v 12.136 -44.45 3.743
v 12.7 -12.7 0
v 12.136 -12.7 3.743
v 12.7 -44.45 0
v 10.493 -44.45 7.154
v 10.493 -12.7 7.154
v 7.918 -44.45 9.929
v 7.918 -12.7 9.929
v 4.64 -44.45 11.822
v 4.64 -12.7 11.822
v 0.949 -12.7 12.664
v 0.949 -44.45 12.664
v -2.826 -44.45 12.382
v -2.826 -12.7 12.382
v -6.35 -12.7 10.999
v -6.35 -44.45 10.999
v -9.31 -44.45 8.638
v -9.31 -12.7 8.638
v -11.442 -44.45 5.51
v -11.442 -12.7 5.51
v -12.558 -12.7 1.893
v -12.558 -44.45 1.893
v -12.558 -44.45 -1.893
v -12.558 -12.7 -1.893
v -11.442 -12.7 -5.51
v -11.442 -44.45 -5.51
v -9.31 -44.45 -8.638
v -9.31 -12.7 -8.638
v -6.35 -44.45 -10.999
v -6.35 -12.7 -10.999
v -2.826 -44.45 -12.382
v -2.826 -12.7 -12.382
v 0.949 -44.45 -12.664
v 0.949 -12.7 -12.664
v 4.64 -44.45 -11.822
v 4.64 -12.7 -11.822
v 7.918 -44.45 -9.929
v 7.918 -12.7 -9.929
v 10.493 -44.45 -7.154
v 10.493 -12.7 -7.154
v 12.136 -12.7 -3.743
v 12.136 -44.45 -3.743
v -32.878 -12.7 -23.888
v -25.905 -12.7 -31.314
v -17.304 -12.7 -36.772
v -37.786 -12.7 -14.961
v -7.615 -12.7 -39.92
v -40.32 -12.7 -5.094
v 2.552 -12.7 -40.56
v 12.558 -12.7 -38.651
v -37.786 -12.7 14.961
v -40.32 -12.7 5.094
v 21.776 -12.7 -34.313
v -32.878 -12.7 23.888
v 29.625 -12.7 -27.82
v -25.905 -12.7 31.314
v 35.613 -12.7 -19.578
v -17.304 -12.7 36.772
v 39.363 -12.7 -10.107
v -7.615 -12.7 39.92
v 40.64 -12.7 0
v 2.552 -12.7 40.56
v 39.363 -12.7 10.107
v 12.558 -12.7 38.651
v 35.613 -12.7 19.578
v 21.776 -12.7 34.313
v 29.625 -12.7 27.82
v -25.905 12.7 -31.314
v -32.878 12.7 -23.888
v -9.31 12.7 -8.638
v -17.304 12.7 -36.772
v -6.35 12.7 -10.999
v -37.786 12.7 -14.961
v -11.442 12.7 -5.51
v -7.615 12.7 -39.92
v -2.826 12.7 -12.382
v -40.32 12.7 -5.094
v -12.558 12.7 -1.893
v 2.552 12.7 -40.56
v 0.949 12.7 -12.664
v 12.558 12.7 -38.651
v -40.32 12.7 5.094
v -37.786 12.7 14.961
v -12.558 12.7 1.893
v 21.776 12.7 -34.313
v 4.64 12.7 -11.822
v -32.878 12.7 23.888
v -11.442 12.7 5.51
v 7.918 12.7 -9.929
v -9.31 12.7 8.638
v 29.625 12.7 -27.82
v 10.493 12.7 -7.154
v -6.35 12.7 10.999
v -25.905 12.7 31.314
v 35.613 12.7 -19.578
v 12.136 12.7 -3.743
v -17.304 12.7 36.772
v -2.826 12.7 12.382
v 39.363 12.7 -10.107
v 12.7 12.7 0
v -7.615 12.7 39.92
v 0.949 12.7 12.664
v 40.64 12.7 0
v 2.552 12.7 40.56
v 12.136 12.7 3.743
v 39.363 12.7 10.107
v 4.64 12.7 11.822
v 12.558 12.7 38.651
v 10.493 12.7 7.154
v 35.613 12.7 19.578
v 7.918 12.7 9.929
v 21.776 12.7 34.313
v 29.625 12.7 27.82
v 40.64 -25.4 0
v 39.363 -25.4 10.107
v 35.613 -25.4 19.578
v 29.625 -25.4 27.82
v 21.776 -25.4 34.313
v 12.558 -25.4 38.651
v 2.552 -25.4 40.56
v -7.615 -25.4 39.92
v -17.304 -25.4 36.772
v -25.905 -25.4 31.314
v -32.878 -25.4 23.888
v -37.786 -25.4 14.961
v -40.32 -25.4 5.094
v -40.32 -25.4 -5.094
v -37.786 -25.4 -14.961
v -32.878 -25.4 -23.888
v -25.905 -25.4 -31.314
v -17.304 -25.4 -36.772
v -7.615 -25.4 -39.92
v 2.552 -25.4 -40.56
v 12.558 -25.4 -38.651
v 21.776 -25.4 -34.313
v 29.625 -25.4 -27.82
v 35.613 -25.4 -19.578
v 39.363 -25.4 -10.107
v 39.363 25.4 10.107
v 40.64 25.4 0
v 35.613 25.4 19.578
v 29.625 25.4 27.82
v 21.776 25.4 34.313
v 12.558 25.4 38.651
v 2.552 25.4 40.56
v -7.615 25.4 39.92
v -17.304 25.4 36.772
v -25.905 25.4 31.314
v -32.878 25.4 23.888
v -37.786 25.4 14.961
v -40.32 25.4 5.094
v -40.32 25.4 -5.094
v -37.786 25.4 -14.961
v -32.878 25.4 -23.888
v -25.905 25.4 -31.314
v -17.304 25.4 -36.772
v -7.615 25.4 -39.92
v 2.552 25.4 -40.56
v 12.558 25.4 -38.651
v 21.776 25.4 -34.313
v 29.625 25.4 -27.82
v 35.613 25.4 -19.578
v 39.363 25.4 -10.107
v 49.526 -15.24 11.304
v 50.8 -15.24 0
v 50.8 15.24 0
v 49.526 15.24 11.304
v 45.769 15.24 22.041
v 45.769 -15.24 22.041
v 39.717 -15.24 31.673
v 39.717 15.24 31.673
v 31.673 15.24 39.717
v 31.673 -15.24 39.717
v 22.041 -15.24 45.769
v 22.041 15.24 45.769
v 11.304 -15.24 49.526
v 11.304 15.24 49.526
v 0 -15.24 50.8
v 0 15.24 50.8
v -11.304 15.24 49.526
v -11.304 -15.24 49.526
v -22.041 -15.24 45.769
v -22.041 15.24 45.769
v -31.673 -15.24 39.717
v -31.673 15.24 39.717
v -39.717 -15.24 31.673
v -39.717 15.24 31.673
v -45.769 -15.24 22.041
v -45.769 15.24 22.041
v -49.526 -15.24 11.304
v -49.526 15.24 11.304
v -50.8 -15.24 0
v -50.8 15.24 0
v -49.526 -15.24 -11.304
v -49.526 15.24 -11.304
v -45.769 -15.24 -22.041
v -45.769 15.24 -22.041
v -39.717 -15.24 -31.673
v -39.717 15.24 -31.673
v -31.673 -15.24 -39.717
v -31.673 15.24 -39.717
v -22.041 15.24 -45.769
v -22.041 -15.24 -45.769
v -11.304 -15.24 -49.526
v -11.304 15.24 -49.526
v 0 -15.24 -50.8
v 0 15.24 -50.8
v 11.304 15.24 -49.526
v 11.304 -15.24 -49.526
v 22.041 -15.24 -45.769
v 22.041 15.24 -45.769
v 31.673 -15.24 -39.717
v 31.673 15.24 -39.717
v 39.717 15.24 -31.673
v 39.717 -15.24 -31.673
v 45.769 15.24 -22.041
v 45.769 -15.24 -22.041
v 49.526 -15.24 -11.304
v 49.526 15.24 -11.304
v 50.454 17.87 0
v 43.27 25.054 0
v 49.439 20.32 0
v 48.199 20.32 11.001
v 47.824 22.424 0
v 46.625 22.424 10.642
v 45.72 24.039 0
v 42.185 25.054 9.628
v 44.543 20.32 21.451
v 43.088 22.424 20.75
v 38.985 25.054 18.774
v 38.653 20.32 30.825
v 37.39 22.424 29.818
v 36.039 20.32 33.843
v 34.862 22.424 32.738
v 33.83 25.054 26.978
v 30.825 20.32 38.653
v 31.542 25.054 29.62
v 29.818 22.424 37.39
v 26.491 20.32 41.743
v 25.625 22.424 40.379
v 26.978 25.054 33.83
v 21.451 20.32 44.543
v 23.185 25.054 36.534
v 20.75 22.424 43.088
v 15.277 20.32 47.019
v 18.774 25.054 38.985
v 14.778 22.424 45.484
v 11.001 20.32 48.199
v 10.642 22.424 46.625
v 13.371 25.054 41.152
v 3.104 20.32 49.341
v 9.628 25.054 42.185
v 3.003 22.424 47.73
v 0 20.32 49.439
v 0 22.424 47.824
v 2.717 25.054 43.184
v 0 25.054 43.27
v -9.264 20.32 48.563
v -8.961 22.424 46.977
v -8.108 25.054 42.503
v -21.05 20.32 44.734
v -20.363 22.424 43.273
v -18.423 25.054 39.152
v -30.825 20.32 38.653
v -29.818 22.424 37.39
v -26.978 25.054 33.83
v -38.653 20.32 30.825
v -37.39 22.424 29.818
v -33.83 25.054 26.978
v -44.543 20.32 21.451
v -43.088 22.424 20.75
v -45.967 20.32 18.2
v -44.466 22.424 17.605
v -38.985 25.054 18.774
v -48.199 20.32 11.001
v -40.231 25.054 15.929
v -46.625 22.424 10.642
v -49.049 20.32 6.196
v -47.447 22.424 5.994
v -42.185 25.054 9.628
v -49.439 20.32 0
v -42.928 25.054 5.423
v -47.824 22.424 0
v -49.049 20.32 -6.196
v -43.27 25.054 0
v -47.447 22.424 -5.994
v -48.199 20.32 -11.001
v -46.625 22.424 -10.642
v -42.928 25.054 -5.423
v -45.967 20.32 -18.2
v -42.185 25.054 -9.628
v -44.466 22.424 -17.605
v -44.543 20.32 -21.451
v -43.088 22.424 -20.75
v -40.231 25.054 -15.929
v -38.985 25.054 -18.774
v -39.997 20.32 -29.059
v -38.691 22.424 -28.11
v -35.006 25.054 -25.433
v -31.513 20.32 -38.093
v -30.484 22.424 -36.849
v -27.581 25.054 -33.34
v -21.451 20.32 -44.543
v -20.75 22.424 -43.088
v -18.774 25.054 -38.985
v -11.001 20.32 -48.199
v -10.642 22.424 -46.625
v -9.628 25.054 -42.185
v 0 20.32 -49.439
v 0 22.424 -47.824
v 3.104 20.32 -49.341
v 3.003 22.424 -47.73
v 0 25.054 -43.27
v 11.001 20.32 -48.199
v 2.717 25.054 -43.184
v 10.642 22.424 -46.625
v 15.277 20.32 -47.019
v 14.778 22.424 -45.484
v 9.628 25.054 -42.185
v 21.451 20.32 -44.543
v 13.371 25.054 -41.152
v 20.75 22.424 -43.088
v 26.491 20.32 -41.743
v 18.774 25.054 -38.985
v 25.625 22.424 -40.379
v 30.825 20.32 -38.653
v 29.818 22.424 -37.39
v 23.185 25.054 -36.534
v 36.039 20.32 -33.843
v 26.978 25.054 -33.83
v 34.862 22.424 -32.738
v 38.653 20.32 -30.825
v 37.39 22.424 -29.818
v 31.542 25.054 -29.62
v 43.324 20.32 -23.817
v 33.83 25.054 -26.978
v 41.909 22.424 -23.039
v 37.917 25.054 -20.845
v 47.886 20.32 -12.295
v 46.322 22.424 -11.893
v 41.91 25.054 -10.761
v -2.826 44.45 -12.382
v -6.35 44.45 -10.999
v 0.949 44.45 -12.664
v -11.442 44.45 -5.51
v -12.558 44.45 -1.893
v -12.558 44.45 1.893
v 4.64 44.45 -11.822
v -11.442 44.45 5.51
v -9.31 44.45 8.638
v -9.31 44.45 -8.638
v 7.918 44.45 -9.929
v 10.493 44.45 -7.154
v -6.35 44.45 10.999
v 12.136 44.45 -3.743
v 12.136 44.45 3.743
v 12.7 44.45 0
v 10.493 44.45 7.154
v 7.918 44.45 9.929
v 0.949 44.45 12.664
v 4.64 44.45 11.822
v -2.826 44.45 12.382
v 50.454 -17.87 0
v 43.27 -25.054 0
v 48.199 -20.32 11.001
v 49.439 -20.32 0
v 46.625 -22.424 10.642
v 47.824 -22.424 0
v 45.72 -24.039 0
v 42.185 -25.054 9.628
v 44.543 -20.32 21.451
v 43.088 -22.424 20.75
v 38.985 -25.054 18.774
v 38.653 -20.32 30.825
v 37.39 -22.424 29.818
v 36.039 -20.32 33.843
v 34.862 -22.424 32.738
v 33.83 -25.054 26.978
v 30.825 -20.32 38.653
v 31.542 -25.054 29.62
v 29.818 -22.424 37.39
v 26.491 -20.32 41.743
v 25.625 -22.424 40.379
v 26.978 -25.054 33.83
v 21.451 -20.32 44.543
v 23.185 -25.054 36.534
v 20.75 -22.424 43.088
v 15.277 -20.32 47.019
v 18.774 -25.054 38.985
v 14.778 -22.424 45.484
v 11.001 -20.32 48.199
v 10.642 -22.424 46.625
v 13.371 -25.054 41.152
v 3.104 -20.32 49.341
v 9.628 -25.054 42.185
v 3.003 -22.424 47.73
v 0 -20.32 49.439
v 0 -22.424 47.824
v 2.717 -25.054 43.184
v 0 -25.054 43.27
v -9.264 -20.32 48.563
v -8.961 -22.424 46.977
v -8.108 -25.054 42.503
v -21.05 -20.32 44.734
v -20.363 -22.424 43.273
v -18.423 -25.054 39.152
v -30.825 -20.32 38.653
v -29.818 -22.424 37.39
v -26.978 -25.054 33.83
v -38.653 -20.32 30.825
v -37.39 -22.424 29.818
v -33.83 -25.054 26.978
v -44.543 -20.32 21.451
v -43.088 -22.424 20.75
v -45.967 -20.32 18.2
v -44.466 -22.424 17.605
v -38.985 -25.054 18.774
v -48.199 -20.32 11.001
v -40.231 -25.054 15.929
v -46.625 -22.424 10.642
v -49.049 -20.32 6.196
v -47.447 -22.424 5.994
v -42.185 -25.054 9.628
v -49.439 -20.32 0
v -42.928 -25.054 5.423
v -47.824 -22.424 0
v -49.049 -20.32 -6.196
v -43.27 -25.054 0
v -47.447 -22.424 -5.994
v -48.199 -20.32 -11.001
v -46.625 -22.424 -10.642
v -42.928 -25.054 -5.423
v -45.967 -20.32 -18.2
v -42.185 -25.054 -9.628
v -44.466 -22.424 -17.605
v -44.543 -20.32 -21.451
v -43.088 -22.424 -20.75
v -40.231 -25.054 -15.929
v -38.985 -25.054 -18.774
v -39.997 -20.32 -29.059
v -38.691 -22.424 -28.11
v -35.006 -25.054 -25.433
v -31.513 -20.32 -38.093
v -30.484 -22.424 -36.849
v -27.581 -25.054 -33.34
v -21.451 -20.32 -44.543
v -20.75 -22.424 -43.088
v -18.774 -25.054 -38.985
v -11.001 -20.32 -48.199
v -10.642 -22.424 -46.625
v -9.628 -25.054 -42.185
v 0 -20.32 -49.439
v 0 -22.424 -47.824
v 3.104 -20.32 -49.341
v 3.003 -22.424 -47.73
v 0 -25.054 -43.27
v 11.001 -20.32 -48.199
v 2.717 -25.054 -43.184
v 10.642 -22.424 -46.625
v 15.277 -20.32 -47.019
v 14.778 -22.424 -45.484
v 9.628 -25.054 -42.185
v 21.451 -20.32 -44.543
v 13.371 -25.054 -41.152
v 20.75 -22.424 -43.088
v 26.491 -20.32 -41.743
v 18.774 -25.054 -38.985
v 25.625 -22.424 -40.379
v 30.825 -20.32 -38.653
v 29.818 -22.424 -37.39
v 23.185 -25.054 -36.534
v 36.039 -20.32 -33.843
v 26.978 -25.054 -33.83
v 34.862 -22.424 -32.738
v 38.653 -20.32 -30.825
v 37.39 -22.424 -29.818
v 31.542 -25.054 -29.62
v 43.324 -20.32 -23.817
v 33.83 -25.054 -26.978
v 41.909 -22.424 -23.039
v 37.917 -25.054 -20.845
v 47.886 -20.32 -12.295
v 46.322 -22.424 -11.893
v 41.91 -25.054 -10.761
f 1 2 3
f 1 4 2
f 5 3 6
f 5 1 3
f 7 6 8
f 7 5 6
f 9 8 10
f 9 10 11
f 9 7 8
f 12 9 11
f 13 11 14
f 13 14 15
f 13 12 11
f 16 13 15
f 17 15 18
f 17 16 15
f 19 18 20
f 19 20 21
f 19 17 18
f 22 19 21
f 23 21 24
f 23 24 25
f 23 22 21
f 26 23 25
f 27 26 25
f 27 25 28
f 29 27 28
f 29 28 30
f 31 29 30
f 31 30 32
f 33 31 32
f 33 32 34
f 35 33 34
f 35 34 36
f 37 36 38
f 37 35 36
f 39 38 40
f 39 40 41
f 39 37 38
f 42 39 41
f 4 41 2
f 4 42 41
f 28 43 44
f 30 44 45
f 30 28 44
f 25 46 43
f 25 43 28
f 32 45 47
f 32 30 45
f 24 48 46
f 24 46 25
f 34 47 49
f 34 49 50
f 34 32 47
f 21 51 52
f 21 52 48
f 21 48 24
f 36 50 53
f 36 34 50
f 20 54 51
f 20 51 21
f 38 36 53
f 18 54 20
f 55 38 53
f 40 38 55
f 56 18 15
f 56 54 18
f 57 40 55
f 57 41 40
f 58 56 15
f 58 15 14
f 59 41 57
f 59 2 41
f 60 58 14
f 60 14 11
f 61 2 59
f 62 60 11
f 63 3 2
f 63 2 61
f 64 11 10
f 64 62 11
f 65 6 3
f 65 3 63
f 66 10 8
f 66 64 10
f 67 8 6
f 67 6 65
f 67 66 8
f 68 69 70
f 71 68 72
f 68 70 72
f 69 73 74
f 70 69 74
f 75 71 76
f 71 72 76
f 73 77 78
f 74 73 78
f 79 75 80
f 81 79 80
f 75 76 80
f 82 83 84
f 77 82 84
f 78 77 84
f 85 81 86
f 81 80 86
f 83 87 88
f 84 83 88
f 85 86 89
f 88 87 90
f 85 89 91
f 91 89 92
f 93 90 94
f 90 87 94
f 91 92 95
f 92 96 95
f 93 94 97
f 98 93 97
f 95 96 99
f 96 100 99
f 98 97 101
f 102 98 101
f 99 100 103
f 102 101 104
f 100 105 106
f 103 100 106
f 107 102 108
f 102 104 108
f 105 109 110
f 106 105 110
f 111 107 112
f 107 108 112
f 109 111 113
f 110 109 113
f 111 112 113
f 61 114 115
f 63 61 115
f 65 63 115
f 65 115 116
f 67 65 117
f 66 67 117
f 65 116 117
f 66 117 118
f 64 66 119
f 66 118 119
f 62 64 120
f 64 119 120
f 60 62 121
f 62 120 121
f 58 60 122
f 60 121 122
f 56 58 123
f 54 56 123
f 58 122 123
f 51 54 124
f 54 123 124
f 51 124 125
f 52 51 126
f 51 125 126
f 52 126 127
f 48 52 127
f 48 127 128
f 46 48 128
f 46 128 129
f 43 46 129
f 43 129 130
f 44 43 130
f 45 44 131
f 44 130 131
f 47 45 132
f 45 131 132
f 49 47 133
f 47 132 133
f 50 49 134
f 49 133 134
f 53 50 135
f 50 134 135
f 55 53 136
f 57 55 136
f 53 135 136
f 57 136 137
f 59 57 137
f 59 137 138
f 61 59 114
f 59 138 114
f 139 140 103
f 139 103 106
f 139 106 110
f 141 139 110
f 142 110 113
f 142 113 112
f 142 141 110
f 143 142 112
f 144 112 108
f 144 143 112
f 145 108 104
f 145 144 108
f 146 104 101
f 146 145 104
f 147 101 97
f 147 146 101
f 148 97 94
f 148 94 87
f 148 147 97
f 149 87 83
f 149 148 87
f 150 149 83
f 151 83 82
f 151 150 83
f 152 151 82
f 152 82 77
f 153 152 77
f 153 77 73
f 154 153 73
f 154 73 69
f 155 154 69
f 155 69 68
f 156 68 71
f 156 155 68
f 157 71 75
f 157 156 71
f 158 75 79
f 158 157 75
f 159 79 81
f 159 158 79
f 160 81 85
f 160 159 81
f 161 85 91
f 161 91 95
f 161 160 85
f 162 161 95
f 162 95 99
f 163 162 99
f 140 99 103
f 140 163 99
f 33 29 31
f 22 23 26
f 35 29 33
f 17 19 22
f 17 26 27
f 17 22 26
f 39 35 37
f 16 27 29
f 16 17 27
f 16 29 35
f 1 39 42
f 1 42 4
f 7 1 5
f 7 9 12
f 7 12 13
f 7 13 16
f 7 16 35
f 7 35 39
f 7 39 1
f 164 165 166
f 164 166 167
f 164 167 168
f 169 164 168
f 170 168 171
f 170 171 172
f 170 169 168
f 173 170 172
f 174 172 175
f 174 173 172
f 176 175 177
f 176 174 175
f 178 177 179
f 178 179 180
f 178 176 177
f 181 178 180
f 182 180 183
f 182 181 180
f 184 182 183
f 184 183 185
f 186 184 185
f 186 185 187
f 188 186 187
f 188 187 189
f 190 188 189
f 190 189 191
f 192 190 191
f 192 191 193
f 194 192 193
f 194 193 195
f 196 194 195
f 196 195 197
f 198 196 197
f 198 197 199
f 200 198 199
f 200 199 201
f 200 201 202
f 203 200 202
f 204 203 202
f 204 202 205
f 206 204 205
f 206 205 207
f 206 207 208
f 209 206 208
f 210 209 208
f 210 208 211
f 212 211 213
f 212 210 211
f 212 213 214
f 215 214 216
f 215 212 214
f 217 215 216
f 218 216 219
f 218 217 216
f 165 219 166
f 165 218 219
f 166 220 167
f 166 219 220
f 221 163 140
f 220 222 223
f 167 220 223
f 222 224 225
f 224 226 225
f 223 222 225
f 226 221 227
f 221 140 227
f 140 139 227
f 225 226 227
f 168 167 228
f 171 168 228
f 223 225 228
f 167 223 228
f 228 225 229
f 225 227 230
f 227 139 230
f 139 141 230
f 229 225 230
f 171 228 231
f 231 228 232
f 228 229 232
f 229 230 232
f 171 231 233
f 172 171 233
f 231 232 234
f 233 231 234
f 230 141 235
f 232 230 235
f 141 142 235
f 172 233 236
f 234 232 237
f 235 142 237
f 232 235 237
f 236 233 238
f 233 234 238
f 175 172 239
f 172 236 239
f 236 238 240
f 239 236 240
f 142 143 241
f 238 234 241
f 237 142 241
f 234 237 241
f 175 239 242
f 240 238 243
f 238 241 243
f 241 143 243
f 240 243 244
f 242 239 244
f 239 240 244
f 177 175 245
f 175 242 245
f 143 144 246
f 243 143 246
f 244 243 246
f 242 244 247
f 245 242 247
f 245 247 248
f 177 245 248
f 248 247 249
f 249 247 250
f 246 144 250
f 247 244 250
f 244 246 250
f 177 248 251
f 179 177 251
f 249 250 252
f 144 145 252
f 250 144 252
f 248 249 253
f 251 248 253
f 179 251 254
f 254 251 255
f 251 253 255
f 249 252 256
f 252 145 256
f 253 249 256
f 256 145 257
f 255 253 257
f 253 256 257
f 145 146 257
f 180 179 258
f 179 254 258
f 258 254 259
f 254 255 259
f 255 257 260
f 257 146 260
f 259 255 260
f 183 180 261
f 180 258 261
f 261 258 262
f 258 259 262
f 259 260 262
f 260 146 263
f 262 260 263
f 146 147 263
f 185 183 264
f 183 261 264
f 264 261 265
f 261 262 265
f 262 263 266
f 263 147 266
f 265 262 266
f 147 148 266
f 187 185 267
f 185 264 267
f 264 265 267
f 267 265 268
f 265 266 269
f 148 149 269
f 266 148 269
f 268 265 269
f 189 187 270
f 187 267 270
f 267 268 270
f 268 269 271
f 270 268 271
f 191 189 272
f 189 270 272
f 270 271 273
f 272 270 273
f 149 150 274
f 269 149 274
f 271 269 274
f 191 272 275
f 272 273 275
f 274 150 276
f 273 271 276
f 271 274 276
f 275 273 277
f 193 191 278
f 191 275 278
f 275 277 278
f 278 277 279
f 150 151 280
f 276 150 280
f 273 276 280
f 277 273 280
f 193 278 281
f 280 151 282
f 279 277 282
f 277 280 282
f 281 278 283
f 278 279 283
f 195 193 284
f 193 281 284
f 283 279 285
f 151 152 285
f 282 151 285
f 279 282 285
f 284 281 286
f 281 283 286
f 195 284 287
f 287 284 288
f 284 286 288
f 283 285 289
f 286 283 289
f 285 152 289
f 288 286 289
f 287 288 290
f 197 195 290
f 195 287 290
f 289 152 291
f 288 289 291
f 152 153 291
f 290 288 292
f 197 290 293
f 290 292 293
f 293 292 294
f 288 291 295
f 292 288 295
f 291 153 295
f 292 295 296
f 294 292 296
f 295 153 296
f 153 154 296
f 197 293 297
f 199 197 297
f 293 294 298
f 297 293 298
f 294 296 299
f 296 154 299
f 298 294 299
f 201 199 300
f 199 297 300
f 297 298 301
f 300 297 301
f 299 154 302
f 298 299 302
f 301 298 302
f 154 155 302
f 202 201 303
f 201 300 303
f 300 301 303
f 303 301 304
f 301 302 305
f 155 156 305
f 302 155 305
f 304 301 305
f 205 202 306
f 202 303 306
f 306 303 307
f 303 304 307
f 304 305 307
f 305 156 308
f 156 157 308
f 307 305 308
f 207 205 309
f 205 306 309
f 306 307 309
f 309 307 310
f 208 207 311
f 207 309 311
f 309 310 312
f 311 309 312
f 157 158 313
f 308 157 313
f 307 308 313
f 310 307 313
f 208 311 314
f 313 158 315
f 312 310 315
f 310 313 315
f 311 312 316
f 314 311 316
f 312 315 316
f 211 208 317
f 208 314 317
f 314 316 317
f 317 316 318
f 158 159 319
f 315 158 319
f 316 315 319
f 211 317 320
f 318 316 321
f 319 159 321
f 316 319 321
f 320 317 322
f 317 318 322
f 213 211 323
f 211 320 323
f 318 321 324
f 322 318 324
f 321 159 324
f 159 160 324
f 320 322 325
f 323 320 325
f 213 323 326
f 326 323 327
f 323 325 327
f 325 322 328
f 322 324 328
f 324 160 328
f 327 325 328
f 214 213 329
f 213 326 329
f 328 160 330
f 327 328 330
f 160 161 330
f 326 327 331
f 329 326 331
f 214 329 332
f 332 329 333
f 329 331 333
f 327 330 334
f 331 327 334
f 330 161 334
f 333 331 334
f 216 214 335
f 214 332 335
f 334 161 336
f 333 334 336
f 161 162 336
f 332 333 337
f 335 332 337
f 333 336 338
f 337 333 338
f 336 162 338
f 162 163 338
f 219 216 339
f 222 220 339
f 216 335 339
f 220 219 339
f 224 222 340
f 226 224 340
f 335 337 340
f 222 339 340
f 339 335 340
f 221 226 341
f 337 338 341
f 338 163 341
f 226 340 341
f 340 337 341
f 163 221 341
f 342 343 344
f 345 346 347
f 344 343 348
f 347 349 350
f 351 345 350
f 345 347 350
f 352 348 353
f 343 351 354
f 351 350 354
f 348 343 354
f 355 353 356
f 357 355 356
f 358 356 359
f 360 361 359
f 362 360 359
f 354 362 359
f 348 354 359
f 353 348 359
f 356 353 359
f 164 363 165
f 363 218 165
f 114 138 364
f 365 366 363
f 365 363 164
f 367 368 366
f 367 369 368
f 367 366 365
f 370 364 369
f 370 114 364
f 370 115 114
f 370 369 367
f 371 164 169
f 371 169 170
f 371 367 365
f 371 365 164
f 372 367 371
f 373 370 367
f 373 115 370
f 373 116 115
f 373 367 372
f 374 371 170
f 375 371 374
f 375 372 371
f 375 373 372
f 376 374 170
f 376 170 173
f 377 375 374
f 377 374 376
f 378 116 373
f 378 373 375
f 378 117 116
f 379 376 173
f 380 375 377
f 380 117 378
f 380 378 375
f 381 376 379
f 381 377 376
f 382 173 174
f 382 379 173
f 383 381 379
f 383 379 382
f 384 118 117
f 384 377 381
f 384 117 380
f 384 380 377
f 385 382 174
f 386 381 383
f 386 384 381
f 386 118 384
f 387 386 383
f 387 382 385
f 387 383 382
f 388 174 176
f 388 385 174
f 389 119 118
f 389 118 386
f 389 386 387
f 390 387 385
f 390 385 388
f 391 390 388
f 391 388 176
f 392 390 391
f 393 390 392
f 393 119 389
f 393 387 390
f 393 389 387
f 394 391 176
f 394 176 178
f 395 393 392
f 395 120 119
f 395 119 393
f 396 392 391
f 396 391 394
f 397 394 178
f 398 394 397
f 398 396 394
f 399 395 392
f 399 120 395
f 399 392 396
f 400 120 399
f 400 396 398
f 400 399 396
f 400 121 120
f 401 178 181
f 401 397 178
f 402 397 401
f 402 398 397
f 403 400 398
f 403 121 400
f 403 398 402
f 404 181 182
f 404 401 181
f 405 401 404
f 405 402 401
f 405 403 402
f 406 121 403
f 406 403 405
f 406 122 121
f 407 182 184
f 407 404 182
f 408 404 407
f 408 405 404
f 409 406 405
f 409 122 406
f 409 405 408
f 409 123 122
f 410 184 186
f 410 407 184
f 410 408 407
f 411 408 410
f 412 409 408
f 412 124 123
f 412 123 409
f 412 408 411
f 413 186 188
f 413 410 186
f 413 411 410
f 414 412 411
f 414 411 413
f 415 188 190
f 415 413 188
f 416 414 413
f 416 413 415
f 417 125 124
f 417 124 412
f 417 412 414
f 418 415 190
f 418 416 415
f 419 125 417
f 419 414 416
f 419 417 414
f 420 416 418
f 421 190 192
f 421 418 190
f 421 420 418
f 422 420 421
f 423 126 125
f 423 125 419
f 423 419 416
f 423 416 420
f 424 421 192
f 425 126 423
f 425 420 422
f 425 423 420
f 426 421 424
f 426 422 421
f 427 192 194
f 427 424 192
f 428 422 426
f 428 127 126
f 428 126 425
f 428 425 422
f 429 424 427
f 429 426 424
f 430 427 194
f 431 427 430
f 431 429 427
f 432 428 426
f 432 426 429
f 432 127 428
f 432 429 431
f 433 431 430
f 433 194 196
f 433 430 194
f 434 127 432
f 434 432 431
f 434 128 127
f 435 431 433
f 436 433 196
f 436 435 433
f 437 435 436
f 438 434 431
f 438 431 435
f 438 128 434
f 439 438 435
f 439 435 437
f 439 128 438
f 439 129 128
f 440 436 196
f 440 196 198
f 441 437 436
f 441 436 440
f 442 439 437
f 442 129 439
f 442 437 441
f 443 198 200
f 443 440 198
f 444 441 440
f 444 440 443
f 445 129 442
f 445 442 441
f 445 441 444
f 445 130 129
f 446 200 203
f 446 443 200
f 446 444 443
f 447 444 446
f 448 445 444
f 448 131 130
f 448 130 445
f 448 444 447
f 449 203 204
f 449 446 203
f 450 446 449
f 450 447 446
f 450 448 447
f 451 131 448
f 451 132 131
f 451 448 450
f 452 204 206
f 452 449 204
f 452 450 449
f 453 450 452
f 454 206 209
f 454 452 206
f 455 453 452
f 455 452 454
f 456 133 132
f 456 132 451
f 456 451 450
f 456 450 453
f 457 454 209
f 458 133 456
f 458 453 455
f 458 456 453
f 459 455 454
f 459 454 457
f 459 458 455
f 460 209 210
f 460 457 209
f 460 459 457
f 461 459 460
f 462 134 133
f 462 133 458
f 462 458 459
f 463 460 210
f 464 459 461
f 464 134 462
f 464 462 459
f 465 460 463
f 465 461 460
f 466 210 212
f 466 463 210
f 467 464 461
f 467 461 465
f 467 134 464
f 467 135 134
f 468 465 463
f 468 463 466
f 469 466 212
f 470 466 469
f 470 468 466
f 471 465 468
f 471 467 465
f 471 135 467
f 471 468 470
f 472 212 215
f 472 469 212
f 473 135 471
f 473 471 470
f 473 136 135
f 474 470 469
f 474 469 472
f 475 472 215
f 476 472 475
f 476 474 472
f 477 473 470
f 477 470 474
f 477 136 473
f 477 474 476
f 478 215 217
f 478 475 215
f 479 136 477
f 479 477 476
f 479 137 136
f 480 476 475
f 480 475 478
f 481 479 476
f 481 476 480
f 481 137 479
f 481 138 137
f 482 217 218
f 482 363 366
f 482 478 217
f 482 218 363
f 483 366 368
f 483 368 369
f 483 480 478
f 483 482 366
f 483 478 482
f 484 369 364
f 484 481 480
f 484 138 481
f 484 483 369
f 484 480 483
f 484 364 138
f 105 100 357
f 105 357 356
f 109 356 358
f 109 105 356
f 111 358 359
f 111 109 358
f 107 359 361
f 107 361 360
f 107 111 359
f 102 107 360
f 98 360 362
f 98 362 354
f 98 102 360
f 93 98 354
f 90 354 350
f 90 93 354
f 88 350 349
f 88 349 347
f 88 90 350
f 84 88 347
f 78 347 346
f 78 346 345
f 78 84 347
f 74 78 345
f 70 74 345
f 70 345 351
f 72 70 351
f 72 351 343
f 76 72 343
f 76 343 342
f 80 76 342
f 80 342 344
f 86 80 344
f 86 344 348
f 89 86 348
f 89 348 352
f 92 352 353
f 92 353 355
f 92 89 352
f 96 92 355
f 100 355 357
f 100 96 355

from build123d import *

# Parameters (mm, degrees)
F0_R     = 50.8
F1_DEPTH = 25.4
F2_R     = 10.16
F3_DEPTH = 12.7
F4_DEPTH = 12.7
F5_R     = 12.7
F6_DEPTH = 44.45


with BuildPart() as f1:
    # F0 (on Front) → F1 (new body, symmetric)
    with BuildSketch(Plane.XZ):
        Circle(F0_R)
    extrude(amount=F1_DEPTH, both=True)

    # F2
    f2_edges = [f1.edges().sort_by_distance(p)[0] for p in [
        (-50.8, -25.4, 0),
        (-50.8, 25.4, 0),
    ]]
    fillet(f2_edges, radius=F2_R)

    # F3 (cut): faces of the model
    f3_faces = [f1.faces().sort_by_distance(p)[0] for p in [
        (0, -25.4, 0),
        (0, 25.4, 0),
    ]]
    extrude(f3_faces, amount=F3_DEPTH, dir=(0, -1, 0), mode=Mode.SUBTRACT)

    # F4 (cut): a face of the model
    f4_faces = [f1.faces().sort_by_distance(p)[0] for p in [
        (0, -25.4, 0),
    ]]
    extrude(f4_faces, amount=-F4_DEPTH, mode=Mode.SUBTRACT)

    # F5 (on Front) → F6 (join, symmetric)
    with BuildSketch(Plane.XZ):
        Circle(F5_R)
    extrude(amount=F6_DEPTH, both=True)


solid = f1.part
